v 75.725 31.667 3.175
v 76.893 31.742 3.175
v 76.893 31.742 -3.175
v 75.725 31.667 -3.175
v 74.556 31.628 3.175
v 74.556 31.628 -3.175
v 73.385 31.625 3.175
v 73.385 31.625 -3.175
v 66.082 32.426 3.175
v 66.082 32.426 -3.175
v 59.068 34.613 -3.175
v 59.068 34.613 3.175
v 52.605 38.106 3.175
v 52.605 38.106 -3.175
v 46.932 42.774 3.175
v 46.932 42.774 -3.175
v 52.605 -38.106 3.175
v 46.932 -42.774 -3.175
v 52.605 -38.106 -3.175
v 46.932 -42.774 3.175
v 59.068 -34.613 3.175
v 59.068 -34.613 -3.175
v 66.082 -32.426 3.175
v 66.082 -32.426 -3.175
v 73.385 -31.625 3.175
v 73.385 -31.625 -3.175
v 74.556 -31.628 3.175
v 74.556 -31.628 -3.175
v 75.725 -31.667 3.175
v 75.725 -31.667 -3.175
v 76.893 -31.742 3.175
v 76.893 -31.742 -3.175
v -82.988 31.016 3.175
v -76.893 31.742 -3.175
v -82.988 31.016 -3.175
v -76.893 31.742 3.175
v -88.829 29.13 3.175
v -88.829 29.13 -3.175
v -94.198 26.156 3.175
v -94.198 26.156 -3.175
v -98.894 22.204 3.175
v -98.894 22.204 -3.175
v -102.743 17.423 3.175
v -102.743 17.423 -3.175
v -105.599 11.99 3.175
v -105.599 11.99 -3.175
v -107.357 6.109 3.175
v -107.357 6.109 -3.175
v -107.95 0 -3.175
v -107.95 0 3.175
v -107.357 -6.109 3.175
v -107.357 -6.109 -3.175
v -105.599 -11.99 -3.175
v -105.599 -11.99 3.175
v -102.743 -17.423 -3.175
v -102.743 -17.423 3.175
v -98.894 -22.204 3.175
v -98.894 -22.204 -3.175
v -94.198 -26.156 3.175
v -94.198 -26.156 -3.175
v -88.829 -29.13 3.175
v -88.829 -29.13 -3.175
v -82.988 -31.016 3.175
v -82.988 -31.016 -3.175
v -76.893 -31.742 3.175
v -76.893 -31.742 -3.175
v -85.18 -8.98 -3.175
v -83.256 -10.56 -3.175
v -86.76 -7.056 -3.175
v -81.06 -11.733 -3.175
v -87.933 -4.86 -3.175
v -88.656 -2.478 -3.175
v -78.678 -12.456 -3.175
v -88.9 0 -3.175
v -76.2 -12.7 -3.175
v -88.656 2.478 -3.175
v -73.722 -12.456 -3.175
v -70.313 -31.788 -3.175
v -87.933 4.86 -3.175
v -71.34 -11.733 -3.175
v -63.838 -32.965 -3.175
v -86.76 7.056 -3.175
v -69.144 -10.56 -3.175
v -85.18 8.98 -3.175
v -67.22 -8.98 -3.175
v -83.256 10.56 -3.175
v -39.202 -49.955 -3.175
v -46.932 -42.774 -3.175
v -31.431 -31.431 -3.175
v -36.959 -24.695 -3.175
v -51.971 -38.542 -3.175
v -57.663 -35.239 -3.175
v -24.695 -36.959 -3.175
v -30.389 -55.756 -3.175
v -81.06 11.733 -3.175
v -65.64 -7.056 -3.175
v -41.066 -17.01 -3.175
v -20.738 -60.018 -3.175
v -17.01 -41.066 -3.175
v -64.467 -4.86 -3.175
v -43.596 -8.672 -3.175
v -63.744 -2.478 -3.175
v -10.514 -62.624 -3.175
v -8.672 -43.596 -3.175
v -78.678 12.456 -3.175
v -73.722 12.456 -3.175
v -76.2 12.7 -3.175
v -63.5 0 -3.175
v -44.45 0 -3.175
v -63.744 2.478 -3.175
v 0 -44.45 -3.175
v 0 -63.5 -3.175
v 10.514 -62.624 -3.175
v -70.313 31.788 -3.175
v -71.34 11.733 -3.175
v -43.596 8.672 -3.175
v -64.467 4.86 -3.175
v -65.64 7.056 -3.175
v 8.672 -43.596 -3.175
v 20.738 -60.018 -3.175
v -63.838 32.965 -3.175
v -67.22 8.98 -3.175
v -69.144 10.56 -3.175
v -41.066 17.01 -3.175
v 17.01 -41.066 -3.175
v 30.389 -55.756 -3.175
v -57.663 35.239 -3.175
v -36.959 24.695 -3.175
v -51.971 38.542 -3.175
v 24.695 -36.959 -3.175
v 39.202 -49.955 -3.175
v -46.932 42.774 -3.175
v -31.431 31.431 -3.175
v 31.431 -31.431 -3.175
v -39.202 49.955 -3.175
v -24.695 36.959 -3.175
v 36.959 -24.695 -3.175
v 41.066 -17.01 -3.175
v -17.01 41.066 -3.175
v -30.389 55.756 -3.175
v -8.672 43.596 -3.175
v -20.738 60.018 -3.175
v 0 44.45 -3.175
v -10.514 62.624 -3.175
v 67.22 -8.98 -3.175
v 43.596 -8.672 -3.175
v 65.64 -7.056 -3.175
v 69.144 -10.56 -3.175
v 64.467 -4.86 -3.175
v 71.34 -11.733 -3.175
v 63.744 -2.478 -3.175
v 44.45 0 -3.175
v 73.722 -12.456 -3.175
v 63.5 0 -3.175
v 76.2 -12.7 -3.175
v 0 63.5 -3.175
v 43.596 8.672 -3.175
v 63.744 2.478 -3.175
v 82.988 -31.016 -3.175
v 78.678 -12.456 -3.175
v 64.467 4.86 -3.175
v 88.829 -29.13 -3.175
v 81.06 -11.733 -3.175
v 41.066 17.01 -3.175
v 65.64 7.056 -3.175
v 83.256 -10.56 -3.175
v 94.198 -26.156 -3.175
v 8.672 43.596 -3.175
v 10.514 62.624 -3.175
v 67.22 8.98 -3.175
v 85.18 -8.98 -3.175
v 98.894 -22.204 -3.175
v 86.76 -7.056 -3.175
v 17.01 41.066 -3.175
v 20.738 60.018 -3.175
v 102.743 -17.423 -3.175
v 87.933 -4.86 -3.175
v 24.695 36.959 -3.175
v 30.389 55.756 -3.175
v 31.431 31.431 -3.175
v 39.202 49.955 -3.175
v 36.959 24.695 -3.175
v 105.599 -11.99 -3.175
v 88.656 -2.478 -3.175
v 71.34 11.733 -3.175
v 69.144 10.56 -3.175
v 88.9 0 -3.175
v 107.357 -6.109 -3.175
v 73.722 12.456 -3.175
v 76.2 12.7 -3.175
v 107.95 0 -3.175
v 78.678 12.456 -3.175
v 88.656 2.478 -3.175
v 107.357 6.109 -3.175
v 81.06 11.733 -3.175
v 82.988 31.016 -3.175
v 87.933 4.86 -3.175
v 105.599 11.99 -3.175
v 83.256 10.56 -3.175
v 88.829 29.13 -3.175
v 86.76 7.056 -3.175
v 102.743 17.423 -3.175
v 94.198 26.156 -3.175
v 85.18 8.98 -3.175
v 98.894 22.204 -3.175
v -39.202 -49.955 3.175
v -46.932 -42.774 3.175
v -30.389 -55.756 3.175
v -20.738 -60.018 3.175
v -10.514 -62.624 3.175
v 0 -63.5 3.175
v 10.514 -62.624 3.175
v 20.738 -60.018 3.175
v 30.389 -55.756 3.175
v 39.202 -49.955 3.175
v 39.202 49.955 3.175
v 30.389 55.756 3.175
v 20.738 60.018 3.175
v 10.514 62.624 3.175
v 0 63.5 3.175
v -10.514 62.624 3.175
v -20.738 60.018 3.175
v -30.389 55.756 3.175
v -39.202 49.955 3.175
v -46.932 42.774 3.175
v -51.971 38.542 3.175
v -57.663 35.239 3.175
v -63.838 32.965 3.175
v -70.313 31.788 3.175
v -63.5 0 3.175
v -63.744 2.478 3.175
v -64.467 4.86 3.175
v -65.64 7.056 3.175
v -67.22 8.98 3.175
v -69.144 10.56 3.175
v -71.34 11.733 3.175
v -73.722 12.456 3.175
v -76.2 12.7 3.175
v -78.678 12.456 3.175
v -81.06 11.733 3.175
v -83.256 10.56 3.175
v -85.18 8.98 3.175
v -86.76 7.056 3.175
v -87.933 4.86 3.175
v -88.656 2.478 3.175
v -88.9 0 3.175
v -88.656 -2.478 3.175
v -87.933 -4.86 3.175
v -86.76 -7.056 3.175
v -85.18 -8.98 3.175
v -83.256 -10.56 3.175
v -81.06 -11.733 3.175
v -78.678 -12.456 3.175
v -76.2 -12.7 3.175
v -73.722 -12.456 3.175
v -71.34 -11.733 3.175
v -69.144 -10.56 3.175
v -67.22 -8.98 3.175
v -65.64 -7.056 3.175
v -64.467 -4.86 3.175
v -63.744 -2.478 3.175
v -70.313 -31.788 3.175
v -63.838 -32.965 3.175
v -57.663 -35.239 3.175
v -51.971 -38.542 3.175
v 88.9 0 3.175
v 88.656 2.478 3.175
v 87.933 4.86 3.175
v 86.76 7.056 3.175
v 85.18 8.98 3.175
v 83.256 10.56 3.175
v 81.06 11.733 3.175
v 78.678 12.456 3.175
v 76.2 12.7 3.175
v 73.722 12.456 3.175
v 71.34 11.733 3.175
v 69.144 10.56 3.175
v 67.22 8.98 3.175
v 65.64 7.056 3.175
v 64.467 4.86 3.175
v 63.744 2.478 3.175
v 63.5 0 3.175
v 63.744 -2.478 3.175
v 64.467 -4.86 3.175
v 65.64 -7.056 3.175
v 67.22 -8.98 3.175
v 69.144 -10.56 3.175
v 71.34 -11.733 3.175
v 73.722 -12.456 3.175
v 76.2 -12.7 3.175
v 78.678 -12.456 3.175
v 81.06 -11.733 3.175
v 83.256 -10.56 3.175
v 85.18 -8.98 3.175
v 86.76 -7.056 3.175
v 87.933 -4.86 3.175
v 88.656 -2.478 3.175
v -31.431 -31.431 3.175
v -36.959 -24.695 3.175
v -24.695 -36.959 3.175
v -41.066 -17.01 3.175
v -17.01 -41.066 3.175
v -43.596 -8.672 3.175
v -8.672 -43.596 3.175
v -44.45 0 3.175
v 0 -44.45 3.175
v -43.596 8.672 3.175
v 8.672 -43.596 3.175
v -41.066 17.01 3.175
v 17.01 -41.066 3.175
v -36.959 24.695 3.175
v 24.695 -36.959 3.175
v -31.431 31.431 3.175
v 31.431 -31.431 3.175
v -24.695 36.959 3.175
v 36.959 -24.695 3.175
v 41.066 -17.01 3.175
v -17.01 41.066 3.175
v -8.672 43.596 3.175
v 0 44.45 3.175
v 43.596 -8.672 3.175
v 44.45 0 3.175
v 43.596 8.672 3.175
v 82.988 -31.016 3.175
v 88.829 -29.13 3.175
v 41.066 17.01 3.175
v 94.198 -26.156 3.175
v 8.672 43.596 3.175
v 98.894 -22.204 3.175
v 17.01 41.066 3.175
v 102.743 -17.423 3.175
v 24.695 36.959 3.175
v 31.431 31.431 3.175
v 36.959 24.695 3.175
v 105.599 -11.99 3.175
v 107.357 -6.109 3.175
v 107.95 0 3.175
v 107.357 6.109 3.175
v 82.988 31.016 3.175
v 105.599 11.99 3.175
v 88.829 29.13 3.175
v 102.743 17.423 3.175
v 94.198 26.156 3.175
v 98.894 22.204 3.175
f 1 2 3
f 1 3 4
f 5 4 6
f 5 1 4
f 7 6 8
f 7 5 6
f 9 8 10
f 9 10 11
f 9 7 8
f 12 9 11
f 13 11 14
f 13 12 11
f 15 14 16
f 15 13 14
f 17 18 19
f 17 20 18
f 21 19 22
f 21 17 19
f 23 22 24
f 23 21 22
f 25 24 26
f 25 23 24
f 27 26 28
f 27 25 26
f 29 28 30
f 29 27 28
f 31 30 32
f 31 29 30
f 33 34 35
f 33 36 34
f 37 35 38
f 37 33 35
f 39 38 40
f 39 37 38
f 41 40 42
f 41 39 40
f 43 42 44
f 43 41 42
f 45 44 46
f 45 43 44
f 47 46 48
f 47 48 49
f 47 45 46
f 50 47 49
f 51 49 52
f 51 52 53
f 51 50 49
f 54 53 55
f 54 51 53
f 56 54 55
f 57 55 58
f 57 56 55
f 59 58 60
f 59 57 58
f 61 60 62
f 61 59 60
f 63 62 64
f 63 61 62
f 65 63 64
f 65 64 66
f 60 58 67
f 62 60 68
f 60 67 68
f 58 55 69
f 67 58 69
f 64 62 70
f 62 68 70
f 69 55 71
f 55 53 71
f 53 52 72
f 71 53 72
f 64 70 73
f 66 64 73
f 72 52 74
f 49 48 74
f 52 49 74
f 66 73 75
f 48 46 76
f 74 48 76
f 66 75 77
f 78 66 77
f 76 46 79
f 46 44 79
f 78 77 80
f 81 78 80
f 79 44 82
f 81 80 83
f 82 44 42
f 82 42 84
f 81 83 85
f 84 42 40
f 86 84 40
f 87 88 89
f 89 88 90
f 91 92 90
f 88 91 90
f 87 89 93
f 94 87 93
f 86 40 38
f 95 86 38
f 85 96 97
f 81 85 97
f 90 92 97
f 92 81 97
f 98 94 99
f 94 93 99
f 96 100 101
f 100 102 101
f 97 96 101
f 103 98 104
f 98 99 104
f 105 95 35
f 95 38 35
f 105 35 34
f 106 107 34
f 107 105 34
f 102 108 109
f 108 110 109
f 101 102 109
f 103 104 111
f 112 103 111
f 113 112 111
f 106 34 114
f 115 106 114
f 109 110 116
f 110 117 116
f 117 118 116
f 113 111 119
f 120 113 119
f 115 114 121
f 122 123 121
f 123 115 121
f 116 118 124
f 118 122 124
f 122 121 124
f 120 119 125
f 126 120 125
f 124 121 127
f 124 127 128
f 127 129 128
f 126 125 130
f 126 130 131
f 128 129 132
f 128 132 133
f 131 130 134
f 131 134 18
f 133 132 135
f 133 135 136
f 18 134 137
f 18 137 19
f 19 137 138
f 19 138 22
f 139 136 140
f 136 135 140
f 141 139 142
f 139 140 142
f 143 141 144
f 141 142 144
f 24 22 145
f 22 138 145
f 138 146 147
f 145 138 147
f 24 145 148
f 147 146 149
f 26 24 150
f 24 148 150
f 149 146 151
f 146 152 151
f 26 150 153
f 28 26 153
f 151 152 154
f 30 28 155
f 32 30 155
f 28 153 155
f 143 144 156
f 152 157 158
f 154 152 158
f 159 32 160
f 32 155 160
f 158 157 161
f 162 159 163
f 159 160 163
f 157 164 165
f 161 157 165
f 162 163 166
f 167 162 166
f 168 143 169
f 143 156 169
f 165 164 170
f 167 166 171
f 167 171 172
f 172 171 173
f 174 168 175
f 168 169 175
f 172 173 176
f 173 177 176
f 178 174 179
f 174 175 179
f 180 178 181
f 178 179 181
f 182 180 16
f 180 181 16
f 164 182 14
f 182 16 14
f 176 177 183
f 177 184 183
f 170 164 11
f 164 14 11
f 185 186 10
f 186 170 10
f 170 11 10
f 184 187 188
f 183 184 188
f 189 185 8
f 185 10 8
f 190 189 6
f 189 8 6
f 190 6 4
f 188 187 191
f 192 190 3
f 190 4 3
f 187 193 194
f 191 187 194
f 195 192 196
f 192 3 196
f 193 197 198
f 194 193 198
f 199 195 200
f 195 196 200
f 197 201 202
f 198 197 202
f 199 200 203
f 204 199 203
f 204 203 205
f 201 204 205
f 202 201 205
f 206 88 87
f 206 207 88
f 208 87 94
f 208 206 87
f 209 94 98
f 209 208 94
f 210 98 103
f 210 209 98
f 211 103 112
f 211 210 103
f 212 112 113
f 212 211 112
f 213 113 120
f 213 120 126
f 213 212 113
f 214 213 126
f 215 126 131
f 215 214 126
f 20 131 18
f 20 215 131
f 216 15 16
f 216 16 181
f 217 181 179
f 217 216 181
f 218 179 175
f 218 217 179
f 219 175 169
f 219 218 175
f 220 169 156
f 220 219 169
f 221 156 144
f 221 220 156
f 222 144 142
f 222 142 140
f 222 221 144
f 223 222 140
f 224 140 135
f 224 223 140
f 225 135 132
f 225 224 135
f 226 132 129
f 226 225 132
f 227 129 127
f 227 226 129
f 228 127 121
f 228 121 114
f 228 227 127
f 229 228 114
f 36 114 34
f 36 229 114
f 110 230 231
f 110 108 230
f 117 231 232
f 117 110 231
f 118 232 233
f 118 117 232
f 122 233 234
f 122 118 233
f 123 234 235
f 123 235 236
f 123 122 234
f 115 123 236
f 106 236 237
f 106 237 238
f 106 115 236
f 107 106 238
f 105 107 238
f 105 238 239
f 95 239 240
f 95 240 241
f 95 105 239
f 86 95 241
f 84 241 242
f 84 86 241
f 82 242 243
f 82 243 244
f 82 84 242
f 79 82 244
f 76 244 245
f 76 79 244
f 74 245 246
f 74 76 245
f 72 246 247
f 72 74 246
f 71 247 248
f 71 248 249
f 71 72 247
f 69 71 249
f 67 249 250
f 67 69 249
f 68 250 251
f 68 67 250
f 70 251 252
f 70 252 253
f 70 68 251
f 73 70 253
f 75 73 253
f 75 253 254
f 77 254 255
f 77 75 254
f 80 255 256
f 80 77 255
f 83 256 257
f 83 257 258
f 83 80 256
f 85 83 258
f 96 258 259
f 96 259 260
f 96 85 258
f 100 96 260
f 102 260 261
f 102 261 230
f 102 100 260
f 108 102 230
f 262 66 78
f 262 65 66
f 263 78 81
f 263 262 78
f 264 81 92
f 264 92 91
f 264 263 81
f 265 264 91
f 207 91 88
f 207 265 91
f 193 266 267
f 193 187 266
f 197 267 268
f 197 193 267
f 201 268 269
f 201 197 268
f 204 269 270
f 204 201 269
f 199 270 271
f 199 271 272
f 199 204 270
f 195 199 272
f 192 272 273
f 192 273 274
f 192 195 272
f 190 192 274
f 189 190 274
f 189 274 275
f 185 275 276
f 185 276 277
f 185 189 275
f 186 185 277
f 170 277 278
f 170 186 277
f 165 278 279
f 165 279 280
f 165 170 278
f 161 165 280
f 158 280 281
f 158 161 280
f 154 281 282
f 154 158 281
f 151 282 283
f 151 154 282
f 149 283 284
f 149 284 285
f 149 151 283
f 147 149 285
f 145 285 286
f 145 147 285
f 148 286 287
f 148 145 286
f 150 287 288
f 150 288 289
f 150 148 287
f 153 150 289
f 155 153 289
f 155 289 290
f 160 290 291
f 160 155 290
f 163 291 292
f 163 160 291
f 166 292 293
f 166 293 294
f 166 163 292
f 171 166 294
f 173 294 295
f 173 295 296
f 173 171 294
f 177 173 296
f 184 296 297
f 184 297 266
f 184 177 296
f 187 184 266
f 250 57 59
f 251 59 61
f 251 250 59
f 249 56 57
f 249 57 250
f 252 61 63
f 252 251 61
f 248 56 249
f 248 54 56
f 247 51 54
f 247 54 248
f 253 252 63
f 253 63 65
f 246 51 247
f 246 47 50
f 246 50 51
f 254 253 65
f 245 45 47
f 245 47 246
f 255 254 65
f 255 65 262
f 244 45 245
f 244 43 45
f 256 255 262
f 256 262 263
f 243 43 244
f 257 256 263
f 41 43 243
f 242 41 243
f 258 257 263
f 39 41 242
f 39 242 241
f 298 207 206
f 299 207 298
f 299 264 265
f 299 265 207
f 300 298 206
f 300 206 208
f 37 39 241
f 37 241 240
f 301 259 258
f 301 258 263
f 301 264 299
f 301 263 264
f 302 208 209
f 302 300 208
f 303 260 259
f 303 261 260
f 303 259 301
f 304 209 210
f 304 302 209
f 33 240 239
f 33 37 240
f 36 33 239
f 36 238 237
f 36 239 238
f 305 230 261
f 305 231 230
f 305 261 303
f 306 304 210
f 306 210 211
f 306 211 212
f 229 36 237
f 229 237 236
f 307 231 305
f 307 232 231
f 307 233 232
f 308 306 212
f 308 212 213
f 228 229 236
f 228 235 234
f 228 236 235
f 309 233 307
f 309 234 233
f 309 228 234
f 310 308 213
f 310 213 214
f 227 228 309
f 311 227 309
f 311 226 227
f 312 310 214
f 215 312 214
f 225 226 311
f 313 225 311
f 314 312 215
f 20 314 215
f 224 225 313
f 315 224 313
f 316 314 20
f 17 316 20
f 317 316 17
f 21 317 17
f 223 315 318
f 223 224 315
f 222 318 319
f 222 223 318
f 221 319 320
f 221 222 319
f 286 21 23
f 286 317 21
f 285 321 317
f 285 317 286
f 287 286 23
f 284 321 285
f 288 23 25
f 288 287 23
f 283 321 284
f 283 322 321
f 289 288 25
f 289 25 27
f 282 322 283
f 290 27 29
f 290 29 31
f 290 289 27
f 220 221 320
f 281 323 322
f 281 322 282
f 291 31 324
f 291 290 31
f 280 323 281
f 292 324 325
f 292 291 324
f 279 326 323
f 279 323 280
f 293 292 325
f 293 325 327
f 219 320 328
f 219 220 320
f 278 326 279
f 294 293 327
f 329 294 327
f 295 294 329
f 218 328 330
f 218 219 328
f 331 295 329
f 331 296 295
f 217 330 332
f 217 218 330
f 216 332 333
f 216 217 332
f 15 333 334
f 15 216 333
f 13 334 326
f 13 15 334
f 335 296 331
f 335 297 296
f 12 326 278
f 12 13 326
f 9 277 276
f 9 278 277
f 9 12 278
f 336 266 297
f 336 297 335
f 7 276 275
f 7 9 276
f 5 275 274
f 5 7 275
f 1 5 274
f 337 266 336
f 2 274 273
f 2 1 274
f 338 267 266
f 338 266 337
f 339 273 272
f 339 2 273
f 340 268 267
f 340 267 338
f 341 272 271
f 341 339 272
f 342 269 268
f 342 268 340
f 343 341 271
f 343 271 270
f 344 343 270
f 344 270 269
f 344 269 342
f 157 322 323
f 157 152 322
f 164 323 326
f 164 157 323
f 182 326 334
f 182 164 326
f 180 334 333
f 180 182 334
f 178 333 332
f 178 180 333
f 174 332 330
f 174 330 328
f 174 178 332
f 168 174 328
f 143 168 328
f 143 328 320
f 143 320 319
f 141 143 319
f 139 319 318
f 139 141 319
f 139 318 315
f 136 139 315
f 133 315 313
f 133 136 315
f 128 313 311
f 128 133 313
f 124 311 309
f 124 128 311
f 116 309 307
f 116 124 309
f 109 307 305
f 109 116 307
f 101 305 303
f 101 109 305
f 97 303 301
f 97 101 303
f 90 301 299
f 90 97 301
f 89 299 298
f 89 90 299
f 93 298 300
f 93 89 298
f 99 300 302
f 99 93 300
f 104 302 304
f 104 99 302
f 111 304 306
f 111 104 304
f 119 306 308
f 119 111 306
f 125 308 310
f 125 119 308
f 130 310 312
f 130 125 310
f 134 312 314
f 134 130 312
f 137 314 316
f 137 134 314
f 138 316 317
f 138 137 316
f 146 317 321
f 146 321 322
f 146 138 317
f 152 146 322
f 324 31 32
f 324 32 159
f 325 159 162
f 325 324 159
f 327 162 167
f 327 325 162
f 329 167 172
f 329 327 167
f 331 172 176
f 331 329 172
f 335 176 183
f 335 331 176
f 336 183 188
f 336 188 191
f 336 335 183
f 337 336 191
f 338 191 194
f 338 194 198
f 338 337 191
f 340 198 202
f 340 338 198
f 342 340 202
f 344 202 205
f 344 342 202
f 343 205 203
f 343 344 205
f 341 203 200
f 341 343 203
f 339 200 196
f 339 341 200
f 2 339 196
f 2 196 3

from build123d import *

# Parameters (mm, degrees)
F0_R     = 12.7
F0_R_2   = 44.45
F1_DEPTH = 3.175


# Not quite as in the source:
# - a feature names something its author has since deleted; it is built from what else it names


with BuildPart() as f1:
    # F0 (on Top) → F1 (new body, symmetric)
    with BuildSketch(Plane.XY):
        with BuildLine():
            ThreePointArc((46.9318292839, -42.7744479808), (59.0683155093, -34.6129457767), (73.3853173936, -31.624991096))
            ThreePointArc((73.3853173936, -31.624991096), (75.1406474031, -31.6432934166), (76.8932712405, -31.7424301998))
            ThreePointArc((76.8932712405, -31.7424301998), (107.95, 0), (76.8932712405, 31.7424301998))
            ThreePointArc((76.8932712405, 31.7424301998), (75.1406474031, 31.6432934166), (73.3853173936, 31.624991096))
            ThreePointArc((73.3853173936, 31.624991096), (59.0683155093, 34.6129457767), (46.9318292839, 42.7744479808))
            ThreePointArc((46.9318292839, 42.7744479808), (0, 63.5), (-46.9318292839, 42.7744479808))
            ThreePointArc((-46.9318292839, 42.7744479808), (-60.7012108245, 33.968607894), (-76.8932712405, 31.7424301998))
            ThreePointArc((-76.8932712405, 31.7424301998), (-107.95, 0), (-76.8932712405, -31.7424301998))
            ThreePointArc((-76.8932712405, -31.7424301998), (-60.7012108245, -33.968607894), (-46.9318292839, -42.7744479808))
            ThreePointArc((-46.9318292839, -42.7744479808), (0, -63.5), (46.9318292839, -42.7744479808))
        make_face()
        with Locations((-76.2, 0)):
            Circle(F0_R, mode=Mode.SUBTRACT)
        Circle(F0_R_2, mode=Mode.SUBTRACT)
        with Locations((76.2, 0)):
            Circle(F0_R, mode=Mode.SUBTRACT)
    extrude(amount=F1_DEPTH, both=True)


solid = f1.part
